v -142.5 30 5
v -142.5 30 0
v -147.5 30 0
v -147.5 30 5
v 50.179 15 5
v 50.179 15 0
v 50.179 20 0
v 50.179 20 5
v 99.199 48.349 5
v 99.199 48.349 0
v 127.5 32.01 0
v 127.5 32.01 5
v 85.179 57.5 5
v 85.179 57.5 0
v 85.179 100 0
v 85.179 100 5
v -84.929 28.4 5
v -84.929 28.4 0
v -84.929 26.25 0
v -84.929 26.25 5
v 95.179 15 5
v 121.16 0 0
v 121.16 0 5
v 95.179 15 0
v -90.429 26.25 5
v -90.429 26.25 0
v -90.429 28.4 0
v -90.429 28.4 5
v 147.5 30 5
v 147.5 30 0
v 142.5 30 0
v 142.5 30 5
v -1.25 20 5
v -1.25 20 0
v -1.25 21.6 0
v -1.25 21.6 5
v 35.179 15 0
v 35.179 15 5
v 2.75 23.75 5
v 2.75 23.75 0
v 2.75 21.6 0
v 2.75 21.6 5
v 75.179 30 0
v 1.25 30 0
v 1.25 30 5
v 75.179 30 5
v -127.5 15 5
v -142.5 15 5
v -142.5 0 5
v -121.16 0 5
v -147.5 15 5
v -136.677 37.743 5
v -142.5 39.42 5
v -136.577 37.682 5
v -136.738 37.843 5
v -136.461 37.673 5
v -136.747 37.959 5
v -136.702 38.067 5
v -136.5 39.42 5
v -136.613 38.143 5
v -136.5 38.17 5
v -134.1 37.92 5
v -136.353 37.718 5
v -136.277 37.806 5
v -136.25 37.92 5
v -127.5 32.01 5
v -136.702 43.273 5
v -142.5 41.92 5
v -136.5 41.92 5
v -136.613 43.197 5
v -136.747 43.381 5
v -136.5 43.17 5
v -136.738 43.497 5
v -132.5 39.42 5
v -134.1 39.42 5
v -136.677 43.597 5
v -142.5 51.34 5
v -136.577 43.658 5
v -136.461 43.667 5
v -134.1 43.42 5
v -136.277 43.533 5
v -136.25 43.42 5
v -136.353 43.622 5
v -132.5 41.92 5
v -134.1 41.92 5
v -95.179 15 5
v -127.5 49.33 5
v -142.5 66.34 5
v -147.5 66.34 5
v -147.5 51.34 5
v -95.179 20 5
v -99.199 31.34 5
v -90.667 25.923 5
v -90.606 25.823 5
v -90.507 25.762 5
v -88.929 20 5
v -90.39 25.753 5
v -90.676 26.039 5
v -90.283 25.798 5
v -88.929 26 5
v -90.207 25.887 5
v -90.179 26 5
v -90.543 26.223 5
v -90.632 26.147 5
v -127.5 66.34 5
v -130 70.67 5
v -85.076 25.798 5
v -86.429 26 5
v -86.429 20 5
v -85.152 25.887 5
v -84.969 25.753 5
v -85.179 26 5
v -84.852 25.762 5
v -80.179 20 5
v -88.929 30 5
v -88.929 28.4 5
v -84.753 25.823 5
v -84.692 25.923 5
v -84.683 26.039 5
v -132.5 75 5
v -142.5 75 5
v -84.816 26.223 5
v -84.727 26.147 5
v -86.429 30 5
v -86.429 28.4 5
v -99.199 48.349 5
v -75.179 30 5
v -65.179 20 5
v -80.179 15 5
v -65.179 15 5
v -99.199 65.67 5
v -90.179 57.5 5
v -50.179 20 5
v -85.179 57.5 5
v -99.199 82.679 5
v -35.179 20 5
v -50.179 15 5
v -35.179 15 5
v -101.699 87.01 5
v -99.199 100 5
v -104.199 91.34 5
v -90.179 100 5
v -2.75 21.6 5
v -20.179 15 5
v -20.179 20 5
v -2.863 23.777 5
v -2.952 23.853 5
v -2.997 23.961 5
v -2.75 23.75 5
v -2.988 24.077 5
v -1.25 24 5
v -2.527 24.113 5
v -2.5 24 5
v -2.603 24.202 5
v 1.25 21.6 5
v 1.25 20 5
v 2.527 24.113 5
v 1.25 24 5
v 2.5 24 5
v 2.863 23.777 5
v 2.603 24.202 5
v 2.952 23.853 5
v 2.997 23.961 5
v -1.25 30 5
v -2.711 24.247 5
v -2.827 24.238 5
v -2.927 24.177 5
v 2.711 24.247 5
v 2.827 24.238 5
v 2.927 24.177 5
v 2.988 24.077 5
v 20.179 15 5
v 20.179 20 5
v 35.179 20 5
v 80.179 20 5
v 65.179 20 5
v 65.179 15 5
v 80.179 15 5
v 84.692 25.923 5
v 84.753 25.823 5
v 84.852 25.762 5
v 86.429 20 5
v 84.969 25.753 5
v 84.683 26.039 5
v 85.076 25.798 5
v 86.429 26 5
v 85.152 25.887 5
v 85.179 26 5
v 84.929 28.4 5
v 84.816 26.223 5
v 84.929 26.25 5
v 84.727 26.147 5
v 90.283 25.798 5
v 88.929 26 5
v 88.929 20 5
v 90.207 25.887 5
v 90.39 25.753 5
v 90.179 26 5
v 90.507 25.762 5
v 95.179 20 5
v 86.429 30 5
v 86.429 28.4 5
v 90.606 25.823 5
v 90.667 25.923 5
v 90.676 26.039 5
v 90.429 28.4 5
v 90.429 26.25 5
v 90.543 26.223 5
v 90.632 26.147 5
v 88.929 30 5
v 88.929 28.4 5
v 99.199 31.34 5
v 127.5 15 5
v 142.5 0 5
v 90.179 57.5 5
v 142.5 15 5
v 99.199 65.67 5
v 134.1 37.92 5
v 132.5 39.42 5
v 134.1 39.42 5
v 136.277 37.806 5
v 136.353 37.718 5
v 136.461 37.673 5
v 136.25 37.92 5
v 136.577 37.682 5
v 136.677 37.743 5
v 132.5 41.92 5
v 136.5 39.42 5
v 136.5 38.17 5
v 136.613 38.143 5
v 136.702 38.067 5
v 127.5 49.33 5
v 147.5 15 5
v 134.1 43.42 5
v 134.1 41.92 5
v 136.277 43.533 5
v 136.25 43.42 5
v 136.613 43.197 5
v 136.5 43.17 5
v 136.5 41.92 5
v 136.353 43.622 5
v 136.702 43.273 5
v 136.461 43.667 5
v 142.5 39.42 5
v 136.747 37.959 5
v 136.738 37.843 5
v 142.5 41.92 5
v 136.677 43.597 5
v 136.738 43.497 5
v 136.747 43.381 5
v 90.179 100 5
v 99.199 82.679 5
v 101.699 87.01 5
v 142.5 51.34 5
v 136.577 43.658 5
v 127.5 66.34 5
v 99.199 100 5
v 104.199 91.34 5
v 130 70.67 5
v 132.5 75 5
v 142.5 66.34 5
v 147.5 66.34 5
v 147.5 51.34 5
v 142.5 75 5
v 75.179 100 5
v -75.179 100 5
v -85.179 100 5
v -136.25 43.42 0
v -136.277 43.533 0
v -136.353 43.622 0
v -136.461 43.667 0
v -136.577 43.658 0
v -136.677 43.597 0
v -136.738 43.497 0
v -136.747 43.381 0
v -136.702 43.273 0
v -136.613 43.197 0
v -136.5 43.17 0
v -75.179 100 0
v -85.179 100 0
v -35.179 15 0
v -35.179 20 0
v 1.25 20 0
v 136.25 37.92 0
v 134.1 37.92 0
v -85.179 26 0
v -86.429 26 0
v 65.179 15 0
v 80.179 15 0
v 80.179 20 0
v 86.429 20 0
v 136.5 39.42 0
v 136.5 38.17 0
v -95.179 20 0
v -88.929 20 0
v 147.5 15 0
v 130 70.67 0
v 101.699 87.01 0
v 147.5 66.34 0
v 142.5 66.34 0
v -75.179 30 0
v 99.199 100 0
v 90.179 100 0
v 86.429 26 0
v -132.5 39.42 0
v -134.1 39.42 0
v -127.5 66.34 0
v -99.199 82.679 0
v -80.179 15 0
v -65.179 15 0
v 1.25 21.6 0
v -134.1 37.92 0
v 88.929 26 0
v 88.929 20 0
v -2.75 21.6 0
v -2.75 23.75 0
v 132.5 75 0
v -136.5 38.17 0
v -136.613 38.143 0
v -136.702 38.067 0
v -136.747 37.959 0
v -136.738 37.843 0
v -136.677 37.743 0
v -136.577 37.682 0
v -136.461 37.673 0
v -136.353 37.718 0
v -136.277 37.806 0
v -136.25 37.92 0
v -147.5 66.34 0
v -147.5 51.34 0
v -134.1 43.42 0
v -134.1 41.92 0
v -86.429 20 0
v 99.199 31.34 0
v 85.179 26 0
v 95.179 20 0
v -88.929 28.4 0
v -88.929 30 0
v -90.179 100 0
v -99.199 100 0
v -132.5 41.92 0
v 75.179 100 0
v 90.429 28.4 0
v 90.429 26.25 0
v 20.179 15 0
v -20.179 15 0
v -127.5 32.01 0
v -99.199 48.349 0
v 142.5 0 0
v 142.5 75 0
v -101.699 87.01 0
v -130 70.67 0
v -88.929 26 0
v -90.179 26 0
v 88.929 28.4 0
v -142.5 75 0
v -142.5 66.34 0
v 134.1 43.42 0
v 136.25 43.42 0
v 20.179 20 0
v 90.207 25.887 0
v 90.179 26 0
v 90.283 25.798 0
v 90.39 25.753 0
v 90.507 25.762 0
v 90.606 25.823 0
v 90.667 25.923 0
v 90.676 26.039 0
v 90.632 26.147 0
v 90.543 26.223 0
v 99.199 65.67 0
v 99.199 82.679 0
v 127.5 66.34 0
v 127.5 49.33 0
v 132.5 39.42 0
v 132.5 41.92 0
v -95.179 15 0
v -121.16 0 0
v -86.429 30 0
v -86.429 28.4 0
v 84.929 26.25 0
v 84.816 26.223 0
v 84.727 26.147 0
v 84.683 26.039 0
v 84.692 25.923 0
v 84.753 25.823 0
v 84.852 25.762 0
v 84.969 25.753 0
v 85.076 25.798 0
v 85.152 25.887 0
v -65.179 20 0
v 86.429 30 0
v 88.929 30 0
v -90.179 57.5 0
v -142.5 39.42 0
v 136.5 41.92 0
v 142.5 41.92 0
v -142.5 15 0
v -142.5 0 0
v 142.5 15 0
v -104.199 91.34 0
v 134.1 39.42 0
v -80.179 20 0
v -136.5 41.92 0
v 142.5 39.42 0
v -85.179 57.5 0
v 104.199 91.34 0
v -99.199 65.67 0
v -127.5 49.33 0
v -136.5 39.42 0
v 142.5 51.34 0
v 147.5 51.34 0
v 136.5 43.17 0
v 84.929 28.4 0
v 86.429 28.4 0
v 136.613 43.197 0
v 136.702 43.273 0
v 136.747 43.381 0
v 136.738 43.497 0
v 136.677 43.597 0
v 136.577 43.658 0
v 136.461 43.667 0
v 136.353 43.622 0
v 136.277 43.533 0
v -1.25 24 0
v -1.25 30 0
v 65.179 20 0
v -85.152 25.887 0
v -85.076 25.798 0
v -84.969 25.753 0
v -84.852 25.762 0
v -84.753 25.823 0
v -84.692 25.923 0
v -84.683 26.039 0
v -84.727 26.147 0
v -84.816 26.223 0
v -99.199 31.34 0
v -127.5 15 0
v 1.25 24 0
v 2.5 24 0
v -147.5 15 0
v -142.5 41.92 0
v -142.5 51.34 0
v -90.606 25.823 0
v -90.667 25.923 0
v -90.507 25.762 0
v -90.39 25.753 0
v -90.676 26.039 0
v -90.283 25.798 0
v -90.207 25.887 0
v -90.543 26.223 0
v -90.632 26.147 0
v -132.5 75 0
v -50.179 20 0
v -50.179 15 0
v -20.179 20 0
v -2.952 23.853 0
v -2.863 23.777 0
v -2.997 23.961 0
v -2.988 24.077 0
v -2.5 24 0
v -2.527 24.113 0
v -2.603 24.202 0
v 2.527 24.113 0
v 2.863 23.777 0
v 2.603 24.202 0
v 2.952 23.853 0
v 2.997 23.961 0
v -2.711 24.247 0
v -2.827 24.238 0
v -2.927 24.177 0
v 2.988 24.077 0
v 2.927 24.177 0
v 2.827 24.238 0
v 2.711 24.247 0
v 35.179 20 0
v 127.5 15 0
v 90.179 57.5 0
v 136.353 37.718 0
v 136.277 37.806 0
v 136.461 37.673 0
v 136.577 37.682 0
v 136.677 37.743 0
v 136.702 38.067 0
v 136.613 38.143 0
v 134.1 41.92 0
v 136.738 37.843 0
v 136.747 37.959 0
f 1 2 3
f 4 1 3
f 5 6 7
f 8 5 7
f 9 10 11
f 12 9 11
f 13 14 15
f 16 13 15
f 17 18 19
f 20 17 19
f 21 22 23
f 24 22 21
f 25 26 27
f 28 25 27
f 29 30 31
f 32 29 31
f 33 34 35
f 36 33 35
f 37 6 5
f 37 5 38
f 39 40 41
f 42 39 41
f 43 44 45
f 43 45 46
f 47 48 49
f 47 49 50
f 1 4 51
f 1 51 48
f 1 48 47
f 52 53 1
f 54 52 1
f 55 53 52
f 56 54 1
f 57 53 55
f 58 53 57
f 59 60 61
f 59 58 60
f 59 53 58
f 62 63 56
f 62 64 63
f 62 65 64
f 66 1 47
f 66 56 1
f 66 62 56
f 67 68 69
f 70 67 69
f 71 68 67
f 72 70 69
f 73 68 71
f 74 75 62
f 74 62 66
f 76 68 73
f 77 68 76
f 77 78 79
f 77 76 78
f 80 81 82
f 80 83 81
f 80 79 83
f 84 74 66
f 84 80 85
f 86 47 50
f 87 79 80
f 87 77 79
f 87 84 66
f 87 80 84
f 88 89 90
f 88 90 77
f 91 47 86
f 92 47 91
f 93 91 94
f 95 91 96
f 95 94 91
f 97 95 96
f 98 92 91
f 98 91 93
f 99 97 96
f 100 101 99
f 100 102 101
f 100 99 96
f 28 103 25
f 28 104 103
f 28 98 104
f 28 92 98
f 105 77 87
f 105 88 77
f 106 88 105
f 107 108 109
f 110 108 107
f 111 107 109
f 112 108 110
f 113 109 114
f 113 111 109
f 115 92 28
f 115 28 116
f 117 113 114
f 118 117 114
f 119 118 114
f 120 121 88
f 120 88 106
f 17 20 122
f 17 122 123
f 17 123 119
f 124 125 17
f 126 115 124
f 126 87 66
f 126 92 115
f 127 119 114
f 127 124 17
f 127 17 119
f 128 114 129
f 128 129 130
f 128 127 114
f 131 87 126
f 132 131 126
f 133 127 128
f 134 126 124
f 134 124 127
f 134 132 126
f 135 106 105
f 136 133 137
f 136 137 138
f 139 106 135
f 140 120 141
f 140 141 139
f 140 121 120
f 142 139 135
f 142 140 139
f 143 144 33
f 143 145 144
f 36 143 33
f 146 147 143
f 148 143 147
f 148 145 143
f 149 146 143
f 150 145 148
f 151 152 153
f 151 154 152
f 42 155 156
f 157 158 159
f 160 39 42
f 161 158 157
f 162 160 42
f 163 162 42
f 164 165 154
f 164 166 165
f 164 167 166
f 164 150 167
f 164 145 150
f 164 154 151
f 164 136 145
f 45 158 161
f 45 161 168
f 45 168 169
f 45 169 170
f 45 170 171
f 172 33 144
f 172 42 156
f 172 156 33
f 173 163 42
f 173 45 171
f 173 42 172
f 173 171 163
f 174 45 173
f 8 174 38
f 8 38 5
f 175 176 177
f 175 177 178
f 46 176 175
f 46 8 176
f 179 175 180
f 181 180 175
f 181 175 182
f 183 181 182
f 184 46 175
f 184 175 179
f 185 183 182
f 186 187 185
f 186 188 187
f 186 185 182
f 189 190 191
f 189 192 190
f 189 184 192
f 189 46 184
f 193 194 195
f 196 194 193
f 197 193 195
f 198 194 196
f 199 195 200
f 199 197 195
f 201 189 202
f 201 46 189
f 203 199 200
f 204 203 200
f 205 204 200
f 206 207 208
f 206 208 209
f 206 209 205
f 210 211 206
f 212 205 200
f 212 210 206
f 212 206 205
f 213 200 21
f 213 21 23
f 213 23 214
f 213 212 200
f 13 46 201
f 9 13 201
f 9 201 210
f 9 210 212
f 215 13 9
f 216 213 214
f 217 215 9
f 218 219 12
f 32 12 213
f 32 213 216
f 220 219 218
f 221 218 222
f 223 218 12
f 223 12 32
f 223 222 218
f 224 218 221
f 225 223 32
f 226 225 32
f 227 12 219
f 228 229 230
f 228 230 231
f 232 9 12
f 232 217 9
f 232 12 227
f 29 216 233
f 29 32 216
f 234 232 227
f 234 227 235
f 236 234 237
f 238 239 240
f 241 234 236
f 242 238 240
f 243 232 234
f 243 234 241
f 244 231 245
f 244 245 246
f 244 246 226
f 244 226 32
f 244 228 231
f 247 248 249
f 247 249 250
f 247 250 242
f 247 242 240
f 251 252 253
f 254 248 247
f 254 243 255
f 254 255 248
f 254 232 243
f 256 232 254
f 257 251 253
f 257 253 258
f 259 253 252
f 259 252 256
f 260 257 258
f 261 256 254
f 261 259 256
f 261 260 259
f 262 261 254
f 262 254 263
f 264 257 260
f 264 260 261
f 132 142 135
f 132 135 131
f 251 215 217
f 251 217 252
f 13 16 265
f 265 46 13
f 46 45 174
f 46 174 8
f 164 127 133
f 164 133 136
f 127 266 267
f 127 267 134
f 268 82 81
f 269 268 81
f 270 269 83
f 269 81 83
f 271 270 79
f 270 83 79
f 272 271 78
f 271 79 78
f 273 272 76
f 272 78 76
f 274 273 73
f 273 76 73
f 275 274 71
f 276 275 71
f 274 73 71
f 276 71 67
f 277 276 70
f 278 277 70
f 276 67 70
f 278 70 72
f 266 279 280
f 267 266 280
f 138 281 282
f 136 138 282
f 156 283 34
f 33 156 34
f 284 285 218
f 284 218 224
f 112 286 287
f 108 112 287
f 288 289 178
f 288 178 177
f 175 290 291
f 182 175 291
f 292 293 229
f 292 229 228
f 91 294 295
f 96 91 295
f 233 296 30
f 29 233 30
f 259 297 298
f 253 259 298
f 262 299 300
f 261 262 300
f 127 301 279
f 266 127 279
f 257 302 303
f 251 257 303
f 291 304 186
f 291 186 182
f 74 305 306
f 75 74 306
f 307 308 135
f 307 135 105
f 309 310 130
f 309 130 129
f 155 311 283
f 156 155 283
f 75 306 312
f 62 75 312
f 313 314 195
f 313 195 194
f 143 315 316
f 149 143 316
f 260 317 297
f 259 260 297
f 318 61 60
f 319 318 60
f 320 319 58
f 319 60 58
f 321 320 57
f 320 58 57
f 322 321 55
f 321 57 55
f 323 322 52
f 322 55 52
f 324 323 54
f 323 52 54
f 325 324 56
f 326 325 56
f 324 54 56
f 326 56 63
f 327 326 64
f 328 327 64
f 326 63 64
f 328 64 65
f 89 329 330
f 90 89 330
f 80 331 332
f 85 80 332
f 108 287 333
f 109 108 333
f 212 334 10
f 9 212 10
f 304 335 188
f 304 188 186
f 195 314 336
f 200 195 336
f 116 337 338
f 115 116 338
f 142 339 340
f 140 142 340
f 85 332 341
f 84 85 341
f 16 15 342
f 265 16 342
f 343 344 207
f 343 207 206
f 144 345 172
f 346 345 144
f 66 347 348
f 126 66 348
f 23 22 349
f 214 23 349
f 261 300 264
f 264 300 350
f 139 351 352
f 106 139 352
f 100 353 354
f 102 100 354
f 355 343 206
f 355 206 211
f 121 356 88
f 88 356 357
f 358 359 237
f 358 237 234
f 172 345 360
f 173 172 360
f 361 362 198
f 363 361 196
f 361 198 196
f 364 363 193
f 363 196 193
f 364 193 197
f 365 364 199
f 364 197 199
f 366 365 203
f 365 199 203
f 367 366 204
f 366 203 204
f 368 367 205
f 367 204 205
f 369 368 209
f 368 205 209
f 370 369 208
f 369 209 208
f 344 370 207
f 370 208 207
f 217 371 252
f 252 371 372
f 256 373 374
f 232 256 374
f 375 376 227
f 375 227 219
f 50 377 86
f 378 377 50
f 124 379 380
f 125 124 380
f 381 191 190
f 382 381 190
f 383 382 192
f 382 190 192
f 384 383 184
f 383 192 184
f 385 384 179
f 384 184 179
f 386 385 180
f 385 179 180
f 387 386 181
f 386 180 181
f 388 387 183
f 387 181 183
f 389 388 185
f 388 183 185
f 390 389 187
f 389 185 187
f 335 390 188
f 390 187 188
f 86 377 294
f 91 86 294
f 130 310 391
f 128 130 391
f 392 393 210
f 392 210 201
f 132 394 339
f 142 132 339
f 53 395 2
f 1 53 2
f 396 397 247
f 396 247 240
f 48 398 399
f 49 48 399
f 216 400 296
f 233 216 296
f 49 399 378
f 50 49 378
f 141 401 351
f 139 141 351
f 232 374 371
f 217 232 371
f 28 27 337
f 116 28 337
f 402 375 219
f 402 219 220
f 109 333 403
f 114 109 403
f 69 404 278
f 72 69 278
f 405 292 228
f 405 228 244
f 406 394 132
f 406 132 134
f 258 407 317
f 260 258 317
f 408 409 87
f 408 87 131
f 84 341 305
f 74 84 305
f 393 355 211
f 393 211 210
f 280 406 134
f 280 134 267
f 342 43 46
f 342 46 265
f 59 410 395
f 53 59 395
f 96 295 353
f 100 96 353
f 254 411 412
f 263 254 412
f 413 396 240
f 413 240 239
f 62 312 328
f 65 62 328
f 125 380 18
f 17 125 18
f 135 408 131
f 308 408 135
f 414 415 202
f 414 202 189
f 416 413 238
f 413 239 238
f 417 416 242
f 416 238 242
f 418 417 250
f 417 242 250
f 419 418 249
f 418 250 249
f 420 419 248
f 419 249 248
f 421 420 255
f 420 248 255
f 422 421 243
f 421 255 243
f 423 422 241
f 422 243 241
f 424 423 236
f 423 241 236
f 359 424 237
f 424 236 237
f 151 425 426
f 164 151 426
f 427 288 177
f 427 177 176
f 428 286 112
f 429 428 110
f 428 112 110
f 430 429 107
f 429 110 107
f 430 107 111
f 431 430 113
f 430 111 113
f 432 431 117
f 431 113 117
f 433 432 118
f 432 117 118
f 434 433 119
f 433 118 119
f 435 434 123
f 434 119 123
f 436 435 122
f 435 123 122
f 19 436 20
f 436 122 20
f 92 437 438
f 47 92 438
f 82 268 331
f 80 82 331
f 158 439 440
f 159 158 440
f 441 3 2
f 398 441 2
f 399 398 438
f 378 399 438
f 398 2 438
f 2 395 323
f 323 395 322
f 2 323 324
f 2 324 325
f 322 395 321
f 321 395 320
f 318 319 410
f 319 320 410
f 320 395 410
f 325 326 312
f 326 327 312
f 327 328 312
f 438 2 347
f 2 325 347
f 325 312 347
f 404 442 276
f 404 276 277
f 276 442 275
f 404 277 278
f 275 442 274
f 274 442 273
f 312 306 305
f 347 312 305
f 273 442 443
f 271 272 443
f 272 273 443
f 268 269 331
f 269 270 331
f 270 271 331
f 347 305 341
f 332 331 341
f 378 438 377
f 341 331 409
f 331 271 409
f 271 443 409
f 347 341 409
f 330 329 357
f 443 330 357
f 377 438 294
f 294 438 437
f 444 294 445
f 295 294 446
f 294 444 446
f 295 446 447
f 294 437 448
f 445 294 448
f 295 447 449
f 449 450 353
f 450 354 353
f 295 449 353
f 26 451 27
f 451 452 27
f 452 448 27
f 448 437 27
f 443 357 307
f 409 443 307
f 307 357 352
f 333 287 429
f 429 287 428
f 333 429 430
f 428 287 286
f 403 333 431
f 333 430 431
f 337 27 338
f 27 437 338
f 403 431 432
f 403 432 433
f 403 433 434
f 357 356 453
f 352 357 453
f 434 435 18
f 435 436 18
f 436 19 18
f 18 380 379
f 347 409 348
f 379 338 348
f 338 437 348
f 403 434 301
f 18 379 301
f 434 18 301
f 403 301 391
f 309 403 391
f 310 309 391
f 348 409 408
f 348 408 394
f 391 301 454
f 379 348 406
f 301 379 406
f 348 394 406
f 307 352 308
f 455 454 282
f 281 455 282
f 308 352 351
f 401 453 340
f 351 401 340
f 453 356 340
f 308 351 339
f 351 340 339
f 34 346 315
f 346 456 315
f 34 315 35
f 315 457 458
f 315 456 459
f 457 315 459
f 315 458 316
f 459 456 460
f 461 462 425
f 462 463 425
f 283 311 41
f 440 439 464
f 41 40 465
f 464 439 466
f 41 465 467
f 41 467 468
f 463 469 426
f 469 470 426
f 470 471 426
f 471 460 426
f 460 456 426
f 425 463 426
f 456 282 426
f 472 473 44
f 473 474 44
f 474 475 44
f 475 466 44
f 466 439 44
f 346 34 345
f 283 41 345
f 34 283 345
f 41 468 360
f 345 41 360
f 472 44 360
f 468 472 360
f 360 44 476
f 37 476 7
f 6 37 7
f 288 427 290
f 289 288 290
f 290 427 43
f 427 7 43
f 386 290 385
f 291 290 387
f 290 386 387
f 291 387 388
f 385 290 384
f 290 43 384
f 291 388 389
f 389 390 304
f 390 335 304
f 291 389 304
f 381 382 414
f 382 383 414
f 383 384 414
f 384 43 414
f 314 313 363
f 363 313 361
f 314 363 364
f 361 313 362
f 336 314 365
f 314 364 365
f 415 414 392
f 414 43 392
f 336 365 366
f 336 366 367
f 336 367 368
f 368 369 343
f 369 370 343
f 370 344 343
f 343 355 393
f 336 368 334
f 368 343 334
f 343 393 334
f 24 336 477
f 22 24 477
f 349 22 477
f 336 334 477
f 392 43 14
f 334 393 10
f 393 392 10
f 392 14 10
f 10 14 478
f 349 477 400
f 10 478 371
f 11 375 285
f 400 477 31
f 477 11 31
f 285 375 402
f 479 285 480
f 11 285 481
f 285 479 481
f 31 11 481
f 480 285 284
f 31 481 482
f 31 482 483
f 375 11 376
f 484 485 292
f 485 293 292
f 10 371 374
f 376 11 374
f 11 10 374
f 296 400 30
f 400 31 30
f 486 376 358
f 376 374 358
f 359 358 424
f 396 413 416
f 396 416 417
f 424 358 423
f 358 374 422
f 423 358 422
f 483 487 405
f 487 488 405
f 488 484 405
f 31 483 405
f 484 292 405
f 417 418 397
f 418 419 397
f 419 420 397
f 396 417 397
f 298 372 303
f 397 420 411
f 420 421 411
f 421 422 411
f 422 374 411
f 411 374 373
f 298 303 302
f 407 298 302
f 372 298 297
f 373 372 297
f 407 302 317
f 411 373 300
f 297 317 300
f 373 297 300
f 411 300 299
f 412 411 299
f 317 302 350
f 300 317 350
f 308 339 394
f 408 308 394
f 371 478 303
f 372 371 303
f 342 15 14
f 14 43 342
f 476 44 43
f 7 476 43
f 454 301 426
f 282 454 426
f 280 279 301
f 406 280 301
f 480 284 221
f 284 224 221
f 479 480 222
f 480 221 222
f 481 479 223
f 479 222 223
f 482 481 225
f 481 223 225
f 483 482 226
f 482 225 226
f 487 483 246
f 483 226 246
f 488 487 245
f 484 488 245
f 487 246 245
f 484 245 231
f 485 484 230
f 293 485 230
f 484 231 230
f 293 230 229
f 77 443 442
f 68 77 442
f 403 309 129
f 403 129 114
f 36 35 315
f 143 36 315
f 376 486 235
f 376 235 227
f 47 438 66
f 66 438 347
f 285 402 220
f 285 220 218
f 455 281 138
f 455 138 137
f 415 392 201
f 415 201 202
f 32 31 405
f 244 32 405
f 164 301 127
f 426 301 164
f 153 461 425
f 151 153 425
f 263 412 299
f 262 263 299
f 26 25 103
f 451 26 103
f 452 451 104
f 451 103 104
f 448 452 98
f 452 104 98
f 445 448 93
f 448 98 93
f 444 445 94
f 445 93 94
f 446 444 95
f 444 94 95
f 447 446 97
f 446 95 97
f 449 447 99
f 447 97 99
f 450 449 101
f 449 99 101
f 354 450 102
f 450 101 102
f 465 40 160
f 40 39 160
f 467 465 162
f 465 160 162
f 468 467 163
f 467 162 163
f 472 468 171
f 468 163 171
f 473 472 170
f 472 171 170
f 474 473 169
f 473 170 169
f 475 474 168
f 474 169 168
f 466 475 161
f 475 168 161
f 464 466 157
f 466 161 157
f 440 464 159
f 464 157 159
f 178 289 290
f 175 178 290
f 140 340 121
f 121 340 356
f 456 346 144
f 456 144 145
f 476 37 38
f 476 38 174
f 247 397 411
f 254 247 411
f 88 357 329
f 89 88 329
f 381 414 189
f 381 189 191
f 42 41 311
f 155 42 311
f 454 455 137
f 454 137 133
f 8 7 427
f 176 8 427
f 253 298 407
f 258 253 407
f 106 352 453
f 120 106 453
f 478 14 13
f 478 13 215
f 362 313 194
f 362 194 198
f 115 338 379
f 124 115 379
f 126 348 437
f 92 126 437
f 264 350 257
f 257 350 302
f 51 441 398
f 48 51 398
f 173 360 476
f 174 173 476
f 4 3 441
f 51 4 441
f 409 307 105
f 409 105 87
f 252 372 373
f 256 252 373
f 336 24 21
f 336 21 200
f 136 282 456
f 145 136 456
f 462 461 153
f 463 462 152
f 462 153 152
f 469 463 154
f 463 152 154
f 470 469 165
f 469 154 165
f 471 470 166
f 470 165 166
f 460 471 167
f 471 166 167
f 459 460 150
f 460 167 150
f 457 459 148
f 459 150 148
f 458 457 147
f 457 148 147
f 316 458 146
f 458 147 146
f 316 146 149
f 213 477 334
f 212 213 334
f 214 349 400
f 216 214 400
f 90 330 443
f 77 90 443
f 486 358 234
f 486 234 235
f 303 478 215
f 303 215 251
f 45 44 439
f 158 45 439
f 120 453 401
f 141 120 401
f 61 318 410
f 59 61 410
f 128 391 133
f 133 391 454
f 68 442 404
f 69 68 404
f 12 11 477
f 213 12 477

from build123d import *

# Parameters (mm, degrees)
ESTRUSIONE_ESTRUSIONE1_DEPTH = 5
TAGLIO_ESTRUSIONE2_DEPTH     = 6
SCHIZZO5_W                   = 15
SCHIZZO5_H                   = 5
SCHIZZO5_W_2                 = 5
SCHIZZO5_H_2                 = 42.5
SCHIZZO5_W_3                 = 150.358983848
SCHIZZO5_H_3                 = 70
TAGLIO_ESTRUSIONE3_DEPTH     = 6
TAGLIO_ESTRUSIONE4_DEPTH     = 6
SCHIZZO7_R                   = 0.25
TAGLIO_ESTRUSIONE5_DEPTH     = 10


with BuildPart() as part:
    # Schizzo1 → Estrusione-Estrusione1 (new body)
    with BuildSketch(Plane.XY):
        Polygon((-142.5, 75), (-142.5, 66.339745962), (-147.5, 66.339745962), (-147.5, 51.339745962), (-142.5, 51.339745962), (-142.5, 30), (-147.5, 30), (-147.5, 15), (-142.5, 15), (-142.5, 0), (142.5, 0), (142.5, 15), (147.5, 15), (147.5, 30), (142.5, 30), (142.5, 51.339745962), (147.5, 51.339745962), (147.5, 66.339745962), (142.5, 66.339745962), (142.5, 75), (99.198729811, 100), (-99.198729811, 100), align=None)
    extrude(amount=ESTRUSIONE_ESTRUSIONE1_DEPTH)

    # Schizzo2 → Taglio-Estrusione2 (cut, through all)
    with BuildSketch(Plane.XY):
        Polygon((-99.198729811, 82.679491924), (-127.5, 66.339745962), (-127.5, 49.330127019), (-99.198729811, 65.669872981), align=None)
        Polygon((99.198729811, 31.339745962), (99.198729811, 48.349364905), (127.5, 32.009618943), (127.5, 15), align=None)
        Polygon((-95.179491924, 15), (-121.160254038, 0), (121.160254038, 0), (95.179491924, 15), align=None)
        Polygon((-99.198729811, 31.339745962), (-127.5, 15), (-127.5, 32.009618943), (-99.198729811, 48.349364905), align=None)
        Polygon((99.198729811, 65.669872981), (99.198729811, 82.679491924), (127.5, 66.339745962), (127.5, 49.330127019), align=None)
        Polygon((-132.5, 75), (-104.198729811, 91.339745962), (-101.698729811, 87.009618943), (-130, 70.669872981), align=None)
        Polygon((132.5, 75), (130, 70.669872981), (101.698729811, 87.009618943), (104.198729811, 91.339745962), align=None)
    extrude(amount=TAGLIO_ESTRUSIONE2_DEPTH, mode=Mode.SUBTRACT)

    # Schizzo5 → Taglio-Estrusione3 (cut, through all)
    with BuildSketch(Plane.XY):
        with Locations((-87.679491924, 17.5)):
            Rectangle(SCHIZZO5_W, SCHIZZO5_H)
        with Locations((-57.679491924, 17.5)):
            Rectangle(SCHIZZO5_W, SCHIZZO5_H)
        with Locations((-27.679491924, 17.5)):
            Rectangle(SCHIZZO5_W, SCHIZZO5_H)
        with Locations((27.679491924, 17.5)):
            Rectangle(SCHIZZO5_W, SCHIZZO5_H)
        with Locations((57.679491924, 17.5)):
            Rectangle(SCHIZZO5_W, SCHIZZO5_H)
        with Locations((87.679491924, 17.5)):
            Rectangle(SCHIZZO5_W, SCHIZZO5_H)
        with Locations((87.679491924, 78.75)):
            Rectangle(SCHIZZO5_W_2, SCHIZZO5_H_2)
        with Locations((-87.679491924, 78.75)):
            Rectangle(SCHIZZO5_W_2, SCHIZZO5_H_2)
        with Locations((0, 65)):
            Rectangle(SCHIZZO5_W_3, SCHIZZO5_H_3)
    extrude(amount=TAGLIO_ESTRUSIONE3_DEPTH, mode=Mode.SUBTRACT)

    # Schizzo6 → Taglio-Estrusione4 (cut, through all)
    with BuildSketch(Plane.XY):
        Polygon((-142.5, 41.919872981), (-136.5, 41.919872981), (-136.5, 43.419872981), (-134.1, 43.419872981), (-134.1, 41.919872981), (-132.5, 41.919872981), (-132.5, 39.419872981), (-134.1, 39.419872981), (-134.1, 37.919872981), (-136.5, 37.919872981), (-136.5, 39.419872981), (-142.5, 39.419872981), align=None)
        Polygon((134.1, 43.419872981), (134.1, 41.919872981), (132.5, 41.919872981), (132.5, 39.419872981), (134.1, 39.419872981), (134.1, 37.919872981), (136.5, 37.919872981), (136.5, 39.419872981), (142.5, 39.419872981), (142.5, 41.919872981), (136.5, 41.919872981), (136.5, 43.419872981), align=None)
        Polygon((-88.929491924, 20), (-88.929491924, 26), (-90.429491924, 26), (-90.429491924, 28.4), (-88.929491924, 28.4), (-88.929491924, 30), (-86.429491924, 30), (-86.429491924, 28.4), (-84.929491924, 28.4), (-84.929491924, 26), (-86.429491924, 26), (-86.429491924, 20), align=None)
        Polygon((86.429491924, 20), (88.929491924, 20), (88.929491924, 26), (90.429491924, 26), (90.429491924, 28.4), (88.929491924, 28.4), (88.929491924, 30), (86.429491924, 30), (86.429491924, 28.4), (84.929491924, 28.4), (84.929491924, 26), (86.429491924, 26), align=None)
        Polygon((-1.25, 20), (-1.25, 21.6), (-2.75, 21.6), (-2.75, 24), (-1.25, 24), (-1.25, 30), (1.25, 30), (1.25, 24), (2.75, 24), (2.75, 21.6), (1.25, 21.6), (1.25, 20), align=None)
    extrude(amount=TAGLIO_ESTRUSIONE4_DEPTH, mode=Mode.SUBTRACT)

    # Schizzo7 → Taglio-Estrusione5 (cut)
    with BuildSketch(Plane.XY.offset(5)):
        with Locations((-136.5, 43.419872981)):
            Circle(SCHIZZO7_R)
        with Locations((-136.5, 37.919872981)):
            Circle(SCHIZZO7_R)
        with Locations((-90.429491924, 26)):
            Circle(SCHIZZO7_R)
        with Locations((-84.929491924, 26)):
            Circle(SCHIZZO7_R)
        with Locations((-2.75, 24)):
            Circle(SCHIZZO7_R)
        with Locations((2.75, 24)):
            Circle(SCHIZZO7_R)
        with Locations((84.929491924, 26)):
            Circle(SCHIZZO7_R)
        with Locations((90.429491924, 26)):
            Circle(SCHIZZO7_R)
        with Locations((136.5, 43.419872981)):
            Circle(SCHIZZO7_R)
        with Locations((136.5, 37.919872981)):
            Circle(SCHIZZO7_R)
    extrude(amount=-TAGLIO_ESTRUSIONE5_DEPTH, mode=Mode.SUBTRACT)


solid = part.part
